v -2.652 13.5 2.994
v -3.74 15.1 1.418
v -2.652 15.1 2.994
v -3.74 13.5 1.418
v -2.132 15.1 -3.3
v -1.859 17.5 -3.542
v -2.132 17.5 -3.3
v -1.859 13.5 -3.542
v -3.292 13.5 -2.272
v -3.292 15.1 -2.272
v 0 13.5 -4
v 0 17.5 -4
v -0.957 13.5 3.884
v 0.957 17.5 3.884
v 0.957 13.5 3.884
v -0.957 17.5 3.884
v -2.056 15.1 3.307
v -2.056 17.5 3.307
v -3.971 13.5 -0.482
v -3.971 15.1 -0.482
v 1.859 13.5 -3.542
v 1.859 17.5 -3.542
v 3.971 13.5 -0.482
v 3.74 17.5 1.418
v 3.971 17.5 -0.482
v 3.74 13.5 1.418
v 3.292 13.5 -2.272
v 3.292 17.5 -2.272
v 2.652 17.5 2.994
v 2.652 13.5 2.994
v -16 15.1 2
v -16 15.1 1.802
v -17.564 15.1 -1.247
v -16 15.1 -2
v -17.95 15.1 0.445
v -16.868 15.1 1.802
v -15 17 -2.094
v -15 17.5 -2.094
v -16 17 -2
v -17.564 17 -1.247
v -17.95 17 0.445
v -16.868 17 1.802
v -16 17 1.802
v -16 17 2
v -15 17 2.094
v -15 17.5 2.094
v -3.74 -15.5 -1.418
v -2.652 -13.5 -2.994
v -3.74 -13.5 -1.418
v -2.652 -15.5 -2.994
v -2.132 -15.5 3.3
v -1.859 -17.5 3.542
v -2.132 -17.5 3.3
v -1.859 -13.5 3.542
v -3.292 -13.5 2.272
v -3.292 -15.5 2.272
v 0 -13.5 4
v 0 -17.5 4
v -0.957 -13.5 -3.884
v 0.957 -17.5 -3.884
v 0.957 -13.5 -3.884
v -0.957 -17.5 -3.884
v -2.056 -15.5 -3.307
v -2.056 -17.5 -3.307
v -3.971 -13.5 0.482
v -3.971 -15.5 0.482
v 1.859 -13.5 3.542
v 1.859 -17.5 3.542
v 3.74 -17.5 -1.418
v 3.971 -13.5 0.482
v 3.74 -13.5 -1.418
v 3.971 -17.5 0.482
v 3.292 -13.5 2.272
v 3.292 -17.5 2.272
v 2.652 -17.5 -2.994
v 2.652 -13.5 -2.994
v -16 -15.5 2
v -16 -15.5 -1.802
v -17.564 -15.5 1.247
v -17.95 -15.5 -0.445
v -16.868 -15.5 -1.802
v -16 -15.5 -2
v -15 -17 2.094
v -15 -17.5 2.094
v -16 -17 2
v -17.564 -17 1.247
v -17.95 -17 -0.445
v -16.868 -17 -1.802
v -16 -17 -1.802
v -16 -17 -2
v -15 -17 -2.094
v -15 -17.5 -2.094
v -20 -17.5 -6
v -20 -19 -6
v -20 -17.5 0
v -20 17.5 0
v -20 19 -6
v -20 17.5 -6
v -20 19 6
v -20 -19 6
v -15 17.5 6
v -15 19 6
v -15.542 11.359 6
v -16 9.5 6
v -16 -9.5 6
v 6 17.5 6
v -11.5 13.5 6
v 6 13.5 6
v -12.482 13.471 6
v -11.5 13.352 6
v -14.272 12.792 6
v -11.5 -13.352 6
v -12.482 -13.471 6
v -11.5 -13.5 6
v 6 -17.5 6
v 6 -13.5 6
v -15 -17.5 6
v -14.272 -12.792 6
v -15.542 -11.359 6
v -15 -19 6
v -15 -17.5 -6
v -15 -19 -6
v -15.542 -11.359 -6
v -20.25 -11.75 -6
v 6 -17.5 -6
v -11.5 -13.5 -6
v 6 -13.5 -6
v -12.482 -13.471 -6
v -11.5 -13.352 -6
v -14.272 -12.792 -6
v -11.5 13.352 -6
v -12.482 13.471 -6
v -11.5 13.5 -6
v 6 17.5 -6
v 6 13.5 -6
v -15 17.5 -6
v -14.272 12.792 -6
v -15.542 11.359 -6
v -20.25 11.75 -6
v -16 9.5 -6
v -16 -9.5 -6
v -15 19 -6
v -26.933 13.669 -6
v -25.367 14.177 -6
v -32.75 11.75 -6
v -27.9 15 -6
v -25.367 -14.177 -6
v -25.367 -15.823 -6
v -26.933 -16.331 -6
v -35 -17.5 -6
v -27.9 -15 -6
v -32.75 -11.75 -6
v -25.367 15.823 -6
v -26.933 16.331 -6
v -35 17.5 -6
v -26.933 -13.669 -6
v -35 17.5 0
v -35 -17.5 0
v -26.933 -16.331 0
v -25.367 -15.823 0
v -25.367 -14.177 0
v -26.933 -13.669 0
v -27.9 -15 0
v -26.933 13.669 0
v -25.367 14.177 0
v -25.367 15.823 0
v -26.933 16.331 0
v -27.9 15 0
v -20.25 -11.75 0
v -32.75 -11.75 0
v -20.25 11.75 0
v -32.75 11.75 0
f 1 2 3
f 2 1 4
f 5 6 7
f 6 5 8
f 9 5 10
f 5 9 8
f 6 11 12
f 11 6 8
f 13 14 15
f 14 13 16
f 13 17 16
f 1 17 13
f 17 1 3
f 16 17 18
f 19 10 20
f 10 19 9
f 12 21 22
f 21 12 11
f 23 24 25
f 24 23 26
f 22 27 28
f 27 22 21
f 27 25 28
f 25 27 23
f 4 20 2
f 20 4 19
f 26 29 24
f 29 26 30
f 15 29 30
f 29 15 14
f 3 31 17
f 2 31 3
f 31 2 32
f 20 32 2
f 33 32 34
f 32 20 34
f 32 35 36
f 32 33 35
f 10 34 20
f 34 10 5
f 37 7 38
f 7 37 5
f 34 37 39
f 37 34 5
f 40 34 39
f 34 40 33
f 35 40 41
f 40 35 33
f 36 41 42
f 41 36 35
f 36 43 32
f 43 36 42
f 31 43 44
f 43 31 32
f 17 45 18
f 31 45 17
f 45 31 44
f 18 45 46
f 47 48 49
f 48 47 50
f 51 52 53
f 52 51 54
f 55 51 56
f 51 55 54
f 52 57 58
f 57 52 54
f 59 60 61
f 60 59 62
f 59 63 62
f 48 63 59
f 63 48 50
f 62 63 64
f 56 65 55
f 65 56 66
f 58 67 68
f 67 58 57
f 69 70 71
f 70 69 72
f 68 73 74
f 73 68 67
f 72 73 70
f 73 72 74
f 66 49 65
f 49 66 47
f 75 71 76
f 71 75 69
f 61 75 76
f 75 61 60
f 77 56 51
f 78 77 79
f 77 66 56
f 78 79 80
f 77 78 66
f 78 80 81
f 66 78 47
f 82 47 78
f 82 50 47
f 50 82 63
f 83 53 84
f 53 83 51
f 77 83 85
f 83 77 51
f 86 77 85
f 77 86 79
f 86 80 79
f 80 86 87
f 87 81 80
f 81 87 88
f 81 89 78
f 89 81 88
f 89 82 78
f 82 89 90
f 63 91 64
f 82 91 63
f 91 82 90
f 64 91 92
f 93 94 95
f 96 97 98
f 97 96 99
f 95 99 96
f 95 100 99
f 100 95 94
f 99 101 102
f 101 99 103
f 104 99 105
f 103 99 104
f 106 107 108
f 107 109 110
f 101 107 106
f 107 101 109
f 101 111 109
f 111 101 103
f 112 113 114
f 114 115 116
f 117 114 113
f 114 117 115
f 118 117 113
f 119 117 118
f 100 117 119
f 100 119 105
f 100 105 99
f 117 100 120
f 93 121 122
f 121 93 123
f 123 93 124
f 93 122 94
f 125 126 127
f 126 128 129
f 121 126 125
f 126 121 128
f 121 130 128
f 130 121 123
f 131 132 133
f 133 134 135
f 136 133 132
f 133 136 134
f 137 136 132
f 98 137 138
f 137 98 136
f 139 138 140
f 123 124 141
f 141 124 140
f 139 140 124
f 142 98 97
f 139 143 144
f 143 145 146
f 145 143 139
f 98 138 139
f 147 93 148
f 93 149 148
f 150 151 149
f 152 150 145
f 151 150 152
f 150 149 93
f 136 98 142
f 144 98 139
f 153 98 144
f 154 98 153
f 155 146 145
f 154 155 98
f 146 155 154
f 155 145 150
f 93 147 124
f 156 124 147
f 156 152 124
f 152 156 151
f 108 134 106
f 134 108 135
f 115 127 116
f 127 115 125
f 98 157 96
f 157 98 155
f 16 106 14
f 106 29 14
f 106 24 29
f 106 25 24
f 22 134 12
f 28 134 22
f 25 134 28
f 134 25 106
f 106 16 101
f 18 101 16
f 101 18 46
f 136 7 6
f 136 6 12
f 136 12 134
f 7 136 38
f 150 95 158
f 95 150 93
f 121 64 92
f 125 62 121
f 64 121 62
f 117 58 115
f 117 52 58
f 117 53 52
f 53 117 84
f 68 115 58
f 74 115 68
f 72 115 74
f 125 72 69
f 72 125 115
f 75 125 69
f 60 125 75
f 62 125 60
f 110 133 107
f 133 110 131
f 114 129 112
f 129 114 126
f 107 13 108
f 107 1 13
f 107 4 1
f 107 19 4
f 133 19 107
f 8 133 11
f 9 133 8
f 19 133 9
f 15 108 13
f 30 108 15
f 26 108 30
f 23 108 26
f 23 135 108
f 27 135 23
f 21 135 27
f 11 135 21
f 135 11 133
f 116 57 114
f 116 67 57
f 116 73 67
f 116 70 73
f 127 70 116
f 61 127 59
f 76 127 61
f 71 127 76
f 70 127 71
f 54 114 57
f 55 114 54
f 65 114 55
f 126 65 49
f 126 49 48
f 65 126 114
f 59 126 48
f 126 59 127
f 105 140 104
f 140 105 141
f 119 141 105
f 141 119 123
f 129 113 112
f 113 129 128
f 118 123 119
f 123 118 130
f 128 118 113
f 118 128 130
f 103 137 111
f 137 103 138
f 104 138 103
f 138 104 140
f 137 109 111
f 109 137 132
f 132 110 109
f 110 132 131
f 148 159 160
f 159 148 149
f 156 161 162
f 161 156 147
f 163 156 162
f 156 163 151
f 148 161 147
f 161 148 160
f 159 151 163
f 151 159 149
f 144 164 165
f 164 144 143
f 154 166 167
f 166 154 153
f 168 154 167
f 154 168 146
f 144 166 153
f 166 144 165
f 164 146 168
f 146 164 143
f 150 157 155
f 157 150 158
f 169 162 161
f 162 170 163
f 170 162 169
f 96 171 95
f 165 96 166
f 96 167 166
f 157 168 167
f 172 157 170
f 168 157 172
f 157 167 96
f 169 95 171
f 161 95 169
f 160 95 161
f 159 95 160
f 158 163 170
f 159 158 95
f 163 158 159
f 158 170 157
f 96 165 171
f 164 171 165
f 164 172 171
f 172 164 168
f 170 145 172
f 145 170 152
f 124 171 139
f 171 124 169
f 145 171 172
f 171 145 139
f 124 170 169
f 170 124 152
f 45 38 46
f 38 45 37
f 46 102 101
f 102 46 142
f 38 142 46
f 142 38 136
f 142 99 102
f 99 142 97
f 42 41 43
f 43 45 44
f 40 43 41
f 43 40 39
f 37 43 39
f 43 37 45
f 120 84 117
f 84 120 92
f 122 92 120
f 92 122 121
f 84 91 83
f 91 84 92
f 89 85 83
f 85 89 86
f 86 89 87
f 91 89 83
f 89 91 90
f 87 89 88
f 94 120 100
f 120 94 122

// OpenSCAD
// file: servo_arm.scad
module servo_arm(body_r = 8/2, arm_r1 = 7/2, arm_r2 = 4/2, arm_len = 16, arm_t = 2.5, body_t = 7) {
	cylinder(r = body_r, h = body_t);
	
	linear_extrude(height = arm_t) {
		circle(r = arm_r1);
		translate([0,arm_len,0]) circle(r = arm_r2);
		polygon(points = [ [-arm_r1, 0], [arm_r1, 0], [arm_r2, arm_len], [-arm_r2, arm_len] ]);
	}
}
// file: servo.scad
// 3dof quad
//
// servo



module servo(a = 30, b = 23, c = 27, d = 12, e = 33, f = 16, flange_thickness = 2, top_cap_pct = 0.5) {
	rem_height = c - flange_thickness - f;
	top_cap_height = rem_height * top_cap_pct;
	roundel_height = rem_height * (1.0 - top_cap_pct);	

	translate([0, -d/2, 0]) union() {
		translate([0,0,flange_thickness/2]) cube([d, e, flange_thickness], center = true);
		translate([0,0,-f/2]) cube([d, b, f], center = true);
		translate([0,0,flange_thickness + top_cap_height/2]) cube([d, b, top_cap_height], center = true);
		translate([0,b/2 - d/2,flange_thickness + top_cap_height]) union() {
			cylinder(r = d/2, h = roundel_height);
			translate([0,0,roundel_height]) cylinder(r = 3, h = 3);
		}
	}
}

//color("blue") servo();
// main file
// 3dof quad 
//
// coxa

include <servo.scad>
include <servo_arm.scad>

module coxa(servo_height = 27, servo_clearance = 7) {
	arm_thick = 4;
	servo_width = 12;
	flange_length = 3;
	base_thick = 4;
	root_radius = 4;
	block(servo_width);
	translate([0, -36, 0]) block(servo_width);
	fork_width = servo_width + flange_length + servo_clearance + base_thick;
	fork_height = arm_thick * 2 + servo_height;
	
	servo_cog_offset = 6;

	translate([fork_width/2 - servo_cog_offset, 0, 0]) union() {
		difference() {
			cube([fork_width, fork_height, 12], center = true);
			translate([-root_radius/2 - base_thick/2 - 1, 0, 0]) cube([1 + servo_width + flange_length + servo_clearance - root_radius, servo_height, 13], center = true);
			translate([-base_thick/2, 0, 0]) cube([servo_width + flange_length + servo_clearance, servo_height-2*root_radius, 13], center = true);
			translate([5, -9.5, 0]) cylinder(r = root_radius, h = 13, center = true);	
			translate([5, 9.5, 0]) cylinder(r = root_radius, h = 13, center = true);	
			color("white") translate([servo_cog_offset - fork_width/2, 0.1 + fork_height/2, 0]) rotate([90, 90, 0]) servo_arm();	
			color("white") translate([servo_cog_offset - fork_width/2, -35.5 + fork_height/2, 0]) rotate([90, 270, 180]) servo_arm();
		}

		translate([fork_width/2 + 15/2, 0, -3]) {
			difference() {	
				cube([15, fork_height, 6], center = true);
				translate([-1, 0, 0]) cube([12.5, 23.5, 7], center = true);
				for(i = [-1, 1]) {
					translate([-1, i * 30/2, 0]) cylinder(r=1.4, h=20, center = true);
				}

			}
		}
		
	}

}


module block(servo_width)
{
	translate([15, 17, -6])
	{
		cube([5, 2, servo_width]);
	}
}
//translate([0,15,0]) coxa(); 
scale([-1, 1, 1]) coxa();
